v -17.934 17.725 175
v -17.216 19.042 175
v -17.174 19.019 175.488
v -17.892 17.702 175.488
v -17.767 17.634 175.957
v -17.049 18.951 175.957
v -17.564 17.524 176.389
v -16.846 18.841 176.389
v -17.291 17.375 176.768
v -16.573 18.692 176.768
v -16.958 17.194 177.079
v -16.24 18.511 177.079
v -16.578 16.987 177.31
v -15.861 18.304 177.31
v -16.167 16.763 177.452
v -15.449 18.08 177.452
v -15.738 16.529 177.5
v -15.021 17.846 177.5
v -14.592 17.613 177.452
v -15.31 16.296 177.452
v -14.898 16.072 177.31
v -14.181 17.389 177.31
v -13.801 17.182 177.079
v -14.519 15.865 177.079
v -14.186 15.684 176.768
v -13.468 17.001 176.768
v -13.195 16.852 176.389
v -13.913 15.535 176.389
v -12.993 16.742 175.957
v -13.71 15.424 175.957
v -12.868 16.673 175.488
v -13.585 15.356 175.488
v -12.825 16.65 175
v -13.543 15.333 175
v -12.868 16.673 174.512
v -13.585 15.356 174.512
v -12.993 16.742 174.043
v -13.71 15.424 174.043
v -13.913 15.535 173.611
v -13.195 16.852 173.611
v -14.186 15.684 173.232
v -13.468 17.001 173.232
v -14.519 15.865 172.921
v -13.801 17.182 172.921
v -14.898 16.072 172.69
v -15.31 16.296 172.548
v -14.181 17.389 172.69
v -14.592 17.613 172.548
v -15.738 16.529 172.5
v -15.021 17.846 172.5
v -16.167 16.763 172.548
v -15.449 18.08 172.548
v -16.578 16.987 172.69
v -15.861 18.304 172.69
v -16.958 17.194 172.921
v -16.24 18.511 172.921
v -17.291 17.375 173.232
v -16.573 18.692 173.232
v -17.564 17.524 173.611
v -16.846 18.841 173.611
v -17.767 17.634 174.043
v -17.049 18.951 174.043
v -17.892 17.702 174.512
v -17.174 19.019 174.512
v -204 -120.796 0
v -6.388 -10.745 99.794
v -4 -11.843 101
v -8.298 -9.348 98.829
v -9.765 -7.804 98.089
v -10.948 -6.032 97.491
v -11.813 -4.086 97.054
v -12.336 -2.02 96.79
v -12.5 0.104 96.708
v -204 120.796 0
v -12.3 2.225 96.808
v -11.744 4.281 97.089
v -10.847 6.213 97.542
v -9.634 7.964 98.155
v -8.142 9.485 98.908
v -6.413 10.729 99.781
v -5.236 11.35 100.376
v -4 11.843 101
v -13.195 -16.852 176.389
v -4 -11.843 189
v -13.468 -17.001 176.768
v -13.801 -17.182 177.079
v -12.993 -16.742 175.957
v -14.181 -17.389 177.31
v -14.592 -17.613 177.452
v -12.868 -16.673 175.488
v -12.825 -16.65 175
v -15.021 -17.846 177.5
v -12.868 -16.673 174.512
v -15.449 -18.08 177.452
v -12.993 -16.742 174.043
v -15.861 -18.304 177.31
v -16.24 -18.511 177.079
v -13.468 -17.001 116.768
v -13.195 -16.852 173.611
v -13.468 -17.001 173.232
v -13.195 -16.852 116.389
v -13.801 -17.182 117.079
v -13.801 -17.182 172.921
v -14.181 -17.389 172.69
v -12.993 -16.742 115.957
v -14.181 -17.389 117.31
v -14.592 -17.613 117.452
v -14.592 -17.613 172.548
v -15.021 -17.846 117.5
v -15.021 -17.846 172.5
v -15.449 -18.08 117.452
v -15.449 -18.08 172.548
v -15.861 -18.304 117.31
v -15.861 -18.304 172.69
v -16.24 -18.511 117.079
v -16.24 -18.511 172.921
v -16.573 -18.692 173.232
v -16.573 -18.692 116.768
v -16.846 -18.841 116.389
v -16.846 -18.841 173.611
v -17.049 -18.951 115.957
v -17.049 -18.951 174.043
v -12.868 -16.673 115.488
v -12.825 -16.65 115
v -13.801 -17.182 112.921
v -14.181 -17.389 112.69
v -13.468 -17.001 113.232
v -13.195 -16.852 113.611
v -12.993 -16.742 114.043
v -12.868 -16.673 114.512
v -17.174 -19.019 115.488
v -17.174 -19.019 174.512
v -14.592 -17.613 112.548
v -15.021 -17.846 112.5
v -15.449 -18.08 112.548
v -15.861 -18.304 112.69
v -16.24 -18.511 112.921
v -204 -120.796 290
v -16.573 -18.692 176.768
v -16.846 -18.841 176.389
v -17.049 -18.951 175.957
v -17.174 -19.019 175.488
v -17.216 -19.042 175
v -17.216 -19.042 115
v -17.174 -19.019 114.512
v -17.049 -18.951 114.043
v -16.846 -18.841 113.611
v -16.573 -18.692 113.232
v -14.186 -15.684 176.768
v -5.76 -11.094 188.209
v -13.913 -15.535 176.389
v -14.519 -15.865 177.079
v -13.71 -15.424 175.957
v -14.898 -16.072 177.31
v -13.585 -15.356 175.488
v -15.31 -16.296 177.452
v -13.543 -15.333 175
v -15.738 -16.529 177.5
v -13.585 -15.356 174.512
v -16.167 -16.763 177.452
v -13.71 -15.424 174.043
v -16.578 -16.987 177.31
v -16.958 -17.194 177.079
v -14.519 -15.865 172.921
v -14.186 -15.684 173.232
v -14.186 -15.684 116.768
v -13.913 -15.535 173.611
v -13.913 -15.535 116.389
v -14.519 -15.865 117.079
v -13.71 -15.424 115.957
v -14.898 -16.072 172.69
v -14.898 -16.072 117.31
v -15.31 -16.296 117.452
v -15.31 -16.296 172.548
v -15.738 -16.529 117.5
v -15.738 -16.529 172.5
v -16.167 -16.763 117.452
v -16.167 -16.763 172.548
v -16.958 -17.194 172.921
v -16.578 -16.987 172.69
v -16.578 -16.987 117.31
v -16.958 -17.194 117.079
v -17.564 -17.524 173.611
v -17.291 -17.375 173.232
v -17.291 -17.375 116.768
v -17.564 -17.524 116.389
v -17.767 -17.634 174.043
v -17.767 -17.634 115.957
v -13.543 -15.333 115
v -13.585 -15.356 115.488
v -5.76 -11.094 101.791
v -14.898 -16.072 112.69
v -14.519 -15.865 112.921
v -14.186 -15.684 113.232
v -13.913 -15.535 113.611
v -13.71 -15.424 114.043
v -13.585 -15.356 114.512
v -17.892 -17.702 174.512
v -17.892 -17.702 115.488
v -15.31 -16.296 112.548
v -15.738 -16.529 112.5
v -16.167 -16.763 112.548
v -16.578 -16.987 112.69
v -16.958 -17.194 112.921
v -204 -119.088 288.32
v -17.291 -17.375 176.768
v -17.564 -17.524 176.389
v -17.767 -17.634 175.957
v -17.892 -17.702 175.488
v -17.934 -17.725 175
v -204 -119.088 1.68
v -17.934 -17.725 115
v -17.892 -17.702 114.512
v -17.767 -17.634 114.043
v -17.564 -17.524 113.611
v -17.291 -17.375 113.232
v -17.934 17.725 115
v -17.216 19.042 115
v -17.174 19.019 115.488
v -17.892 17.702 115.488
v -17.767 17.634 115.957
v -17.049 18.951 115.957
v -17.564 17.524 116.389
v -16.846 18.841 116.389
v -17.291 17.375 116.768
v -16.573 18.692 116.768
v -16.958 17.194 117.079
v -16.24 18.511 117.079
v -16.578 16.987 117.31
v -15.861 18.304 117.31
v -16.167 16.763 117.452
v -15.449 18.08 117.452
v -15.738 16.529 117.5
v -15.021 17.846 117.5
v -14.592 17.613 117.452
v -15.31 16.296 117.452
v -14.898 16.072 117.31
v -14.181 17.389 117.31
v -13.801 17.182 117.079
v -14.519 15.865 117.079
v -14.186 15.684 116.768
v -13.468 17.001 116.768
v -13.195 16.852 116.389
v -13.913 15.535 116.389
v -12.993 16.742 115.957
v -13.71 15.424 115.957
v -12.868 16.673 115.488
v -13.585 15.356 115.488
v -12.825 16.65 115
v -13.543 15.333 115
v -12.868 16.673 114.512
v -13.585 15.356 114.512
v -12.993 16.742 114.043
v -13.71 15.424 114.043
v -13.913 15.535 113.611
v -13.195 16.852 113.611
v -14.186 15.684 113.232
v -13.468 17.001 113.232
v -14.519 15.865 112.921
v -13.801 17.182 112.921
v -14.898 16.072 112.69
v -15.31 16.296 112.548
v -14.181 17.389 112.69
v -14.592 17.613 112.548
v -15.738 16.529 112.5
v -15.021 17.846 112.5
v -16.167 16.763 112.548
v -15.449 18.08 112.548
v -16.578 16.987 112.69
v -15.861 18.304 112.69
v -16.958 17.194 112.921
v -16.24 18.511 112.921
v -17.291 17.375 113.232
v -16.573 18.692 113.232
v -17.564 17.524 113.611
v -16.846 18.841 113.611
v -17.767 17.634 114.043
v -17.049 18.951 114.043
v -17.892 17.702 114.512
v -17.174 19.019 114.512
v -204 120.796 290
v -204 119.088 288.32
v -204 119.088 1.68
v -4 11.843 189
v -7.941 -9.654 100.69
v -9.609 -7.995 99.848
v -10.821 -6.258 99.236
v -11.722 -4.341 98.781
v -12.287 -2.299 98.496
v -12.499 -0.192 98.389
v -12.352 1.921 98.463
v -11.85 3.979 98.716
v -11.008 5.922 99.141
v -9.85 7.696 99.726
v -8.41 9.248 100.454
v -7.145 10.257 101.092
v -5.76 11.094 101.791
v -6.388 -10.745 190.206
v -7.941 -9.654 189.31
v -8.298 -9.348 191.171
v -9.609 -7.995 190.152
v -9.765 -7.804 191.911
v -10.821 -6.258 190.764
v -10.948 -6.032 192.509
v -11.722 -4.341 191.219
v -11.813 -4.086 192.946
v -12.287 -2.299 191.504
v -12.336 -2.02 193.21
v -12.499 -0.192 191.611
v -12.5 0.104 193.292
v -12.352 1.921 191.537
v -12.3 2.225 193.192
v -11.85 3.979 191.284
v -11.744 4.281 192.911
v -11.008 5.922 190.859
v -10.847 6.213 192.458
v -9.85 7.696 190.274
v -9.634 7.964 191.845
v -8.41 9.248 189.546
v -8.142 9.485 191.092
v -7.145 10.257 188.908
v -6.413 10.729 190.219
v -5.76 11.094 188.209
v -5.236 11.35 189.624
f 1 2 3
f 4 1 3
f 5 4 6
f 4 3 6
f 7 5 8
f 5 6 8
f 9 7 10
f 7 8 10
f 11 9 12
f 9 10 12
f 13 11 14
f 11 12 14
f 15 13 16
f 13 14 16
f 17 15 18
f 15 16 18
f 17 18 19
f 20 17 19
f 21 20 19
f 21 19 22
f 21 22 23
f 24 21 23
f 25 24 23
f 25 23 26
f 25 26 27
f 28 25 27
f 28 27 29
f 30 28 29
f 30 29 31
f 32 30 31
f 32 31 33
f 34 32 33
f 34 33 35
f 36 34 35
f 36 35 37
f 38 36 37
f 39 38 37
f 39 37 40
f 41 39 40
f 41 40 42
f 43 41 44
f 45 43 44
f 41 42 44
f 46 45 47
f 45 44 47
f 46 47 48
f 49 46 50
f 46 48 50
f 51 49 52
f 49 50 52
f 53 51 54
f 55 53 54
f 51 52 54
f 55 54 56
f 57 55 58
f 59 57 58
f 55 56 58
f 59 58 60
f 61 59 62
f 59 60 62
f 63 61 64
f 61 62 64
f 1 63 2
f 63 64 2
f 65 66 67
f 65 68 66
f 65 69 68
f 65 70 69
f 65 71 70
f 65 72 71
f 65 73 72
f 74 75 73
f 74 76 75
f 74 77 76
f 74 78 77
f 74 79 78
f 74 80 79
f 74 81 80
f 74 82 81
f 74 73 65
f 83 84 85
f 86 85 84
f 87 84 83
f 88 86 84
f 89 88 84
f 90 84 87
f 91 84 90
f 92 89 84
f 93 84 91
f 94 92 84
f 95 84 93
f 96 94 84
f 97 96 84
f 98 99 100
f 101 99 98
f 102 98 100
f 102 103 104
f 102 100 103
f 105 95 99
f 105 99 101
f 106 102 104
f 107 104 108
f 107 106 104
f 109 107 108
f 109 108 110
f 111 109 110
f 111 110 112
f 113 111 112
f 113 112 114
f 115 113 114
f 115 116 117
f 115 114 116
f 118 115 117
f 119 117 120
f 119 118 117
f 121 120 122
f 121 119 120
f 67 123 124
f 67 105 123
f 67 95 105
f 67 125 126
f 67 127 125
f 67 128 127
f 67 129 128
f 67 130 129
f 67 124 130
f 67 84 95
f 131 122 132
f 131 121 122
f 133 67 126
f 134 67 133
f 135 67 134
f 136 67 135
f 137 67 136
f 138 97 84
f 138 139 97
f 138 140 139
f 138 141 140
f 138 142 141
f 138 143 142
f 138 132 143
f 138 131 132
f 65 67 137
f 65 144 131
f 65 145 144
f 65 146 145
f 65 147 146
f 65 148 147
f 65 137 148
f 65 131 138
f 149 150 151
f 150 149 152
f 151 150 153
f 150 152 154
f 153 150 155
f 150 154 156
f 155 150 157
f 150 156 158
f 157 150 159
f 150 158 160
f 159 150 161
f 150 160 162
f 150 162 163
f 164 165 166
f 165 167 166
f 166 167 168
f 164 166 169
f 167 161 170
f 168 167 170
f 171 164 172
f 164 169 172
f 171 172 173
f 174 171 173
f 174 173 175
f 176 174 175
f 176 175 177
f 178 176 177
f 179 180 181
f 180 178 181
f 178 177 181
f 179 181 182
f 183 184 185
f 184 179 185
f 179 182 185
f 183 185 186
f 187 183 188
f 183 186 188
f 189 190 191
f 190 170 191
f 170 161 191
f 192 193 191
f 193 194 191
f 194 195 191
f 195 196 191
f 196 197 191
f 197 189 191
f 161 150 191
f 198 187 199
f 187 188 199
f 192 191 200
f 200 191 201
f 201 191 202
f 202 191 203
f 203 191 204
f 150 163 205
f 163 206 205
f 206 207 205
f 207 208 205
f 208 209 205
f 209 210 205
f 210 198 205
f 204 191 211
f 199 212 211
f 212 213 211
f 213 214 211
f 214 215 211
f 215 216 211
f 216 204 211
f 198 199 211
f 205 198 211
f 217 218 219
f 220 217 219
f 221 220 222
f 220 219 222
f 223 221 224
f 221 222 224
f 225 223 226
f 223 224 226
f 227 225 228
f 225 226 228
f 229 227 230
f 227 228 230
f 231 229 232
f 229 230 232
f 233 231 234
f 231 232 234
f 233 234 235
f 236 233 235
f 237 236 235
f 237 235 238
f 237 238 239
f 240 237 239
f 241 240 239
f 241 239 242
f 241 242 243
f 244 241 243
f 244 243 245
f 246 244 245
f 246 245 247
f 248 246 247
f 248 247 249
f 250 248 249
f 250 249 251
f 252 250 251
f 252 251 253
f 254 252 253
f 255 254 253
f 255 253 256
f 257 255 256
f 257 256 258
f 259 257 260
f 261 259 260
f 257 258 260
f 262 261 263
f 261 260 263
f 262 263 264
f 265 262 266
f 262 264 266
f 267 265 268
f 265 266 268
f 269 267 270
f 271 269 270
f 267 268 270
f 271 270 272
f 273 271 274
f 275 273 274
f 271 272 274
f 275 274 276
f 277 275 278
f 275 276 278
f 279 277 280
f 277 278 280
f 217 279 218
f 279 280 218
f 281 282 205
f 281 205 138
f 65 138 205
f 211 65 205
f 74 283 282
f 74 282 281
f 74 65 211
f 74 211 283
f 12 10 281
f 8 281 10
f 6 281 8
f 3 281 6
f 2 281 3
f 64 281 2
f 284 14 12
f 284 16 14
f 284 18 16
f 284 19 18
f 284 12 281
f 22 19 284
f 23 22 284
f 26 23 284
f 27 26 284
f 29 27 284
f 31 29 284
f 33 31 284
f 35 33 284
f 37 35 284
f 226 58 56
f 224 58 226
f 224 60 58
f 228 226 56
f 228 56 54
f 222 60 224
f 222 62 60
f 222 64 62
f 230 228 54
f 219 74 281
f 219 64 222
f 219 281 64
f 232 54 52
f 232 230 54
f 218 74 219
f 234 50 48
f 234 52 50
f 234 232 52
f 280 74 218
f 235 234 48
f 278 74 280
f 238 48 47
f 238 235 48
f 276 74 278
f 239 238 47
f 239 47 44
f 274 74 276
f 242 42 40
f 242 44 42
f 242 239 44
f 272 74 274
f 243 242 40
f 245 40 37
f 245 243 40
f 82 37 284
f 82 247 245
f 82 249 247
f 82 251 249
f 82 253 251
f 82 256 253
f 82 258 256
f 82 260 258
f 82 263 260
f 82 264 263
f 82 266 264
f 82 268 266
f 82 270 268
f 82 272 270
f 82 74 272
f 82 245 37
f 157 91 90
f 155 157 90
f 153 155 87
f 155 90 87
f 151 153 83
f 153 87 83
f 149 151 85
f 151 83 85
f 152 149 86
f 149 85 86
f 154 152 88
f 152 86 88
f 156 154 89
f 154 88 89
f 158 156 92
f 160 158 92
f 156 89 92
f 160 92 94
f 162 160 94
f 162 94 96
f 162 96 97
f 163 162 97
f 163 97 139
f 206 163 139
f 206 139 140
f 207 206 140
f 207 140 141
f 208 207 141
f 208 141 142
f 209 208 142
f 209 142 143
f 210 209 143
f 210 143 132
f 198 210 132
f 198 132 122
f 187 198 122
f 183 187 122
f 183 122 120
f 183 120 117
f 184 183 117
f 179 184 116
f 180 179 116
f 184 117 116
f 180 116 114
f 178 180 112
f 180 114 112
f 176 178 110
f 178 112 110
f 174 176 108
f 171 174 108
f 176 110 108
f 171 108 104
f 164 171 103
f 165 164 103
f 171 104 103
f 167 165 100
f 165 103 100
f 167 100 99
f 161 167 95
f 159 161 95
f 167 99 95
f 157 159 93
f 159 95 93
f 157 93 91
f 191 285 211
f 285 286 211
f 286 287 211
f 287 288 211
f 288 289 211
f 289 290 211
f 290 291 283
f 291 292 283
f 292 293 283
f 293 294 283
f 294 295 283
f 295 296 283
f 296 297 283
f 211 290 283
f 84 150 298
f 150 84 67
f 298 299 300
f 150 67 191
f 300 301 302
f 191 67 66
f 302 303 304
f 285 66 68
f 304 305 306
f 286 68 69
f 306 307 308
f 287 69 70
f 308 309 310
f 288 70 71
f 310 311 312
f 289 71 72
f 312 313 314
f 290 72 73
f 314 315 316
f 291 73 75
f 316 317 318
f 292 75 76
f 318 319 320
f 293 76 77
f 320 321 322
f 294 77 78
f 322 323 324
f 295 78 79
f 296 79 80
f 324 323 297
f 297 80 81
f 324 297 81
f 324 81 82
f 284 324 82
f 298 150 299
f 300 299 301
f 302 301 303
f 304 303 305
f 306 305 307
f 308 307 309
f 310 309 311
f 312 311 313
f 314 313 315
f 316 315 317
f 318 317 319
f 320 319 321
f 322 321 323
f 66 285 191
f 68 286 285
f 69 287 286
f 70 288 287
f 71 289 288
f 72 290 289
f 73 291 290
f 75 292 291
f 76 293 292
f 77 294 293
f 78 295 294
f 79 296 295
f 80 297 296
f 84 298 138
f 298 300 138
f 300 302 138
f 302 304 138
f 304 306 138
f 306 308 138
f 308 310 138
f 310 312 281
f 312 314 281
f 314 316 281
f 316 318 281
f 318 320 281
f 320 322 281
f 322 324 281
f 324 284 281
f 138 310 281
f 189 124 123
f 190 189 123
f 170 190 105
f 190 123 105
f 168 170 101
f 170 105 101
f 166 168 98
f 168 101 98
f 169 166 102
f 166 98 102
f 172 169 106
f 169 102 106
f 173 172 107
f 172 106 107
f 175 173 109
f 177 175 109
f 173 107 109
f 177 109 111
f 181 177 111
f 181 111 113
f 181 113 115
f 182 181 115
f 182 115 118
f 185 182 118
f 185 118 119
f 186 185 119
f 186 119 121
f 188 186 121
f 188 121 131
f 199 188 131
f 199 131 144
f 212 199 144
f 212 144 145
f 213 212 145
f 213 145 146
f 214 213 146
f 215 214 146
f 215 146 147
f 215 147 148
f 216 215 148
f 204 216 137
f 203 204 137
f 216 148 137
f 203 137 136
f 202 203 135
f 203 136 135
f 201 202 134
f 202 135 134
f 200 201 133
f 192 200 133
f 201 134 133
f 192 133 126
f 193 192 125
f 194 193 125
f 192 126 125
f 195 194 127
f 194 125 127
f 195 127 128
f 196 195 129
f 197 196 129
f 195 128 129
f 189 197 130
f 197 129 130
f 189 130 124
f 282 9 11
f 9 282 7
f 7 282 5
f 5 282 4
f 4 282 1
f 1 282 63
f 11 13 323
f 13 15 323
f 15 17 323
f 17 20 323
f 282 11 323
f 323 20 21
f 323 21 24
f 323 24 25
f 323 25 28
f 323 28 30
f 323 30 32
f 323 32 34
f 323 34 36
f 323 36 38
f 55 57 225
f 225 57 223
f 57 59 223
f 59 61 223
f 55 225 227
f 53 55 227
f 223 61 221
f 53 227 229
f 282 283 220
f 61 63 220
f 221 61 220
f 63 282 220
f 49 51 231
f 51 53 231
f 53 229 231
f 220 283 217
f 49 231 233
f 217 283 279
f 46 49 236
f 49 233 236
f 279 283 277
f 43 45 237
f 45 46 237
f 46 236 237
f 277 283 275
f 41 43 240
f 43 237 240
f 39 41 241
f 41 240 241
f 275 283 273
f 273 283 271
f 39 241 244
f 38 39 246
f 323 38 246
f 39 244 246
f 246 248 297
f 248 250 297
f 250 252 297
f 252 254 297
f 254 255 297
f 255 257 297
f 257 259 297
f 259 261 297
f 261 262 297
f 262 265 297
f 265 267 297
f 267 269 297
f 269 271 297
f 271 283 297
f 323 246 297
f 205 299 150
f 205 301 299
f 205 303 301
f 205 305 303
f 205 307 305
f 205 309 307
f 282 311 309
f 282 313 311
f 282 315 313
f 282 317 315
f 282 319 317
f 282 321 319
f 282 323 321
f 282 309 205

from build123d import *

# Parameters (mm, degrees)
BOSS_EXTRUDE1_DEPTH     = 290
CUT_EXTRUDE1_DEPTH      = 290
CUT_EXTRUDE1_DEPTH_BACK = 290
SHELL3_T                = -1.5
SKETCH3_R               = 2.5
CUT_EXTRUDE2_DEPTH      = 20
SKETCH4_R               = 2.5
CUT_EXTRUDE3_DEPTH      = 18
CUT_EXTRUDE4_DEPTH      = 119
CUT_EXTRUDE4_DEPTH_BACK = 128


with BuildPart() as part:
    # Sketch1 → Boss-Extrude1 (new body)
    with BuildSketch(Plane.XY):
        with BuildLine():
            Line((-4, -11.842719282), (-204, -120.795710387))
            Line((-204, -120.795710387), (-204, 120.795710387))
            Line((-204, 120.795710387), (-4, 11.842719282))
            Line((-4, 11.842719282), (-4, 8.61684397))
            ThreePointArc((-4, 8.61684397), (-9.5, 0), (-4, -8.61684397))
            Line((-4, -8.61684397), (-4, -11.842719282))
        make_face()
    extrude(amount=BOSS_EXTRUDE1_DEPTH)

    # Sketch2 → Cut-Extrude1 (cut, two sides: drawn at the far end of the back side and taken through both)
    with BuildSketch(Plane(origin=(0, 0, 0), x_dir=(-1, 0, 0), z_dir=(0, -1, 0)).offset(-CUT_EXTRUDE1_DEPTH_BACK)):
        Polygon((4, -189), (204, -290), (4, -290), align=None)
        Polygon((4, -101), (204, 0), (4, 0), align=None)
    extrude(amount=CUT_EXTRUDE1_DEPTH + CUT_EXTRUDE1_DEPTH_BACK, mode=Mode.SUBTRACT)

    # Shell3
    shell3_openings = [part.faces().sort_by_distance(p)[0] for p in [
        (-9.5, 0, 145),
        (-204, 0, 145),
    ]]
    offset(amount=SHELL3_T, openings=shell3_openings, kind=Kind.INTERSECTION)

    # Sketch3 → Cut-Extrude2 (cut)
    with BuildSketch(Plane(origin=(4.059646396, -7.452106372, 0), x_dir=(-0.8781500169152763, -0.47838535490930323, 0), z_dir=(0.4783853549093033, -0.8781500169152764, 0))):
        with Locations((21.727983535, -175)):
            Circle(SKETCH3_R)
        with Locations((21.727983535, -115)):
            Circle(SKETCH3_R)
    extrude(amount=-CUT_EXTRUDE2_DEPTH, mode=Mode.SUBTRACT)

    # Sketch4 → Cut-Extrude3 (cut)
    with BuildSketch(Plane(origin=(4.059646396, 7.452106372, 0), x_dir=(0.8781500169152766, -0.47838535490930256, 0), z_dir=(0.47838535490930256, 0.8781500169152766, 0))):
        with Locations((-21.727983535, -115)):
            Circle(SKETCH4_R)
        with Locations((-21.727983535, -175)):
            Circle(SKETCH4_R)
    extrude(amount=-CUT_EXTRUDE3_DEPTH, mode=Mode.SUBTRACT)

    # Sketch6 → Cut-Extrude4 (cut, two sides: drawn at the far end of the back side and taken through both)
    with BuildSketch(Plane.XY.offset(145).offset(-CUT_EXTRUDE4_DEPTH_BACK)):
        with BuildLine():
            Line((-4, 11.842719282), (-4, -11.842719282))
            ThreePointArc((-4, -11.842719282), (-12.5, 0), (-4, 11.842719282))
        make_face()
    extrude(amount=CUT_EXTRUDE4_DEPTH + CUT_EXTRUDE4_DEPTH_BACK, mode=Mode.SUBTRACT)


solid = part.part
